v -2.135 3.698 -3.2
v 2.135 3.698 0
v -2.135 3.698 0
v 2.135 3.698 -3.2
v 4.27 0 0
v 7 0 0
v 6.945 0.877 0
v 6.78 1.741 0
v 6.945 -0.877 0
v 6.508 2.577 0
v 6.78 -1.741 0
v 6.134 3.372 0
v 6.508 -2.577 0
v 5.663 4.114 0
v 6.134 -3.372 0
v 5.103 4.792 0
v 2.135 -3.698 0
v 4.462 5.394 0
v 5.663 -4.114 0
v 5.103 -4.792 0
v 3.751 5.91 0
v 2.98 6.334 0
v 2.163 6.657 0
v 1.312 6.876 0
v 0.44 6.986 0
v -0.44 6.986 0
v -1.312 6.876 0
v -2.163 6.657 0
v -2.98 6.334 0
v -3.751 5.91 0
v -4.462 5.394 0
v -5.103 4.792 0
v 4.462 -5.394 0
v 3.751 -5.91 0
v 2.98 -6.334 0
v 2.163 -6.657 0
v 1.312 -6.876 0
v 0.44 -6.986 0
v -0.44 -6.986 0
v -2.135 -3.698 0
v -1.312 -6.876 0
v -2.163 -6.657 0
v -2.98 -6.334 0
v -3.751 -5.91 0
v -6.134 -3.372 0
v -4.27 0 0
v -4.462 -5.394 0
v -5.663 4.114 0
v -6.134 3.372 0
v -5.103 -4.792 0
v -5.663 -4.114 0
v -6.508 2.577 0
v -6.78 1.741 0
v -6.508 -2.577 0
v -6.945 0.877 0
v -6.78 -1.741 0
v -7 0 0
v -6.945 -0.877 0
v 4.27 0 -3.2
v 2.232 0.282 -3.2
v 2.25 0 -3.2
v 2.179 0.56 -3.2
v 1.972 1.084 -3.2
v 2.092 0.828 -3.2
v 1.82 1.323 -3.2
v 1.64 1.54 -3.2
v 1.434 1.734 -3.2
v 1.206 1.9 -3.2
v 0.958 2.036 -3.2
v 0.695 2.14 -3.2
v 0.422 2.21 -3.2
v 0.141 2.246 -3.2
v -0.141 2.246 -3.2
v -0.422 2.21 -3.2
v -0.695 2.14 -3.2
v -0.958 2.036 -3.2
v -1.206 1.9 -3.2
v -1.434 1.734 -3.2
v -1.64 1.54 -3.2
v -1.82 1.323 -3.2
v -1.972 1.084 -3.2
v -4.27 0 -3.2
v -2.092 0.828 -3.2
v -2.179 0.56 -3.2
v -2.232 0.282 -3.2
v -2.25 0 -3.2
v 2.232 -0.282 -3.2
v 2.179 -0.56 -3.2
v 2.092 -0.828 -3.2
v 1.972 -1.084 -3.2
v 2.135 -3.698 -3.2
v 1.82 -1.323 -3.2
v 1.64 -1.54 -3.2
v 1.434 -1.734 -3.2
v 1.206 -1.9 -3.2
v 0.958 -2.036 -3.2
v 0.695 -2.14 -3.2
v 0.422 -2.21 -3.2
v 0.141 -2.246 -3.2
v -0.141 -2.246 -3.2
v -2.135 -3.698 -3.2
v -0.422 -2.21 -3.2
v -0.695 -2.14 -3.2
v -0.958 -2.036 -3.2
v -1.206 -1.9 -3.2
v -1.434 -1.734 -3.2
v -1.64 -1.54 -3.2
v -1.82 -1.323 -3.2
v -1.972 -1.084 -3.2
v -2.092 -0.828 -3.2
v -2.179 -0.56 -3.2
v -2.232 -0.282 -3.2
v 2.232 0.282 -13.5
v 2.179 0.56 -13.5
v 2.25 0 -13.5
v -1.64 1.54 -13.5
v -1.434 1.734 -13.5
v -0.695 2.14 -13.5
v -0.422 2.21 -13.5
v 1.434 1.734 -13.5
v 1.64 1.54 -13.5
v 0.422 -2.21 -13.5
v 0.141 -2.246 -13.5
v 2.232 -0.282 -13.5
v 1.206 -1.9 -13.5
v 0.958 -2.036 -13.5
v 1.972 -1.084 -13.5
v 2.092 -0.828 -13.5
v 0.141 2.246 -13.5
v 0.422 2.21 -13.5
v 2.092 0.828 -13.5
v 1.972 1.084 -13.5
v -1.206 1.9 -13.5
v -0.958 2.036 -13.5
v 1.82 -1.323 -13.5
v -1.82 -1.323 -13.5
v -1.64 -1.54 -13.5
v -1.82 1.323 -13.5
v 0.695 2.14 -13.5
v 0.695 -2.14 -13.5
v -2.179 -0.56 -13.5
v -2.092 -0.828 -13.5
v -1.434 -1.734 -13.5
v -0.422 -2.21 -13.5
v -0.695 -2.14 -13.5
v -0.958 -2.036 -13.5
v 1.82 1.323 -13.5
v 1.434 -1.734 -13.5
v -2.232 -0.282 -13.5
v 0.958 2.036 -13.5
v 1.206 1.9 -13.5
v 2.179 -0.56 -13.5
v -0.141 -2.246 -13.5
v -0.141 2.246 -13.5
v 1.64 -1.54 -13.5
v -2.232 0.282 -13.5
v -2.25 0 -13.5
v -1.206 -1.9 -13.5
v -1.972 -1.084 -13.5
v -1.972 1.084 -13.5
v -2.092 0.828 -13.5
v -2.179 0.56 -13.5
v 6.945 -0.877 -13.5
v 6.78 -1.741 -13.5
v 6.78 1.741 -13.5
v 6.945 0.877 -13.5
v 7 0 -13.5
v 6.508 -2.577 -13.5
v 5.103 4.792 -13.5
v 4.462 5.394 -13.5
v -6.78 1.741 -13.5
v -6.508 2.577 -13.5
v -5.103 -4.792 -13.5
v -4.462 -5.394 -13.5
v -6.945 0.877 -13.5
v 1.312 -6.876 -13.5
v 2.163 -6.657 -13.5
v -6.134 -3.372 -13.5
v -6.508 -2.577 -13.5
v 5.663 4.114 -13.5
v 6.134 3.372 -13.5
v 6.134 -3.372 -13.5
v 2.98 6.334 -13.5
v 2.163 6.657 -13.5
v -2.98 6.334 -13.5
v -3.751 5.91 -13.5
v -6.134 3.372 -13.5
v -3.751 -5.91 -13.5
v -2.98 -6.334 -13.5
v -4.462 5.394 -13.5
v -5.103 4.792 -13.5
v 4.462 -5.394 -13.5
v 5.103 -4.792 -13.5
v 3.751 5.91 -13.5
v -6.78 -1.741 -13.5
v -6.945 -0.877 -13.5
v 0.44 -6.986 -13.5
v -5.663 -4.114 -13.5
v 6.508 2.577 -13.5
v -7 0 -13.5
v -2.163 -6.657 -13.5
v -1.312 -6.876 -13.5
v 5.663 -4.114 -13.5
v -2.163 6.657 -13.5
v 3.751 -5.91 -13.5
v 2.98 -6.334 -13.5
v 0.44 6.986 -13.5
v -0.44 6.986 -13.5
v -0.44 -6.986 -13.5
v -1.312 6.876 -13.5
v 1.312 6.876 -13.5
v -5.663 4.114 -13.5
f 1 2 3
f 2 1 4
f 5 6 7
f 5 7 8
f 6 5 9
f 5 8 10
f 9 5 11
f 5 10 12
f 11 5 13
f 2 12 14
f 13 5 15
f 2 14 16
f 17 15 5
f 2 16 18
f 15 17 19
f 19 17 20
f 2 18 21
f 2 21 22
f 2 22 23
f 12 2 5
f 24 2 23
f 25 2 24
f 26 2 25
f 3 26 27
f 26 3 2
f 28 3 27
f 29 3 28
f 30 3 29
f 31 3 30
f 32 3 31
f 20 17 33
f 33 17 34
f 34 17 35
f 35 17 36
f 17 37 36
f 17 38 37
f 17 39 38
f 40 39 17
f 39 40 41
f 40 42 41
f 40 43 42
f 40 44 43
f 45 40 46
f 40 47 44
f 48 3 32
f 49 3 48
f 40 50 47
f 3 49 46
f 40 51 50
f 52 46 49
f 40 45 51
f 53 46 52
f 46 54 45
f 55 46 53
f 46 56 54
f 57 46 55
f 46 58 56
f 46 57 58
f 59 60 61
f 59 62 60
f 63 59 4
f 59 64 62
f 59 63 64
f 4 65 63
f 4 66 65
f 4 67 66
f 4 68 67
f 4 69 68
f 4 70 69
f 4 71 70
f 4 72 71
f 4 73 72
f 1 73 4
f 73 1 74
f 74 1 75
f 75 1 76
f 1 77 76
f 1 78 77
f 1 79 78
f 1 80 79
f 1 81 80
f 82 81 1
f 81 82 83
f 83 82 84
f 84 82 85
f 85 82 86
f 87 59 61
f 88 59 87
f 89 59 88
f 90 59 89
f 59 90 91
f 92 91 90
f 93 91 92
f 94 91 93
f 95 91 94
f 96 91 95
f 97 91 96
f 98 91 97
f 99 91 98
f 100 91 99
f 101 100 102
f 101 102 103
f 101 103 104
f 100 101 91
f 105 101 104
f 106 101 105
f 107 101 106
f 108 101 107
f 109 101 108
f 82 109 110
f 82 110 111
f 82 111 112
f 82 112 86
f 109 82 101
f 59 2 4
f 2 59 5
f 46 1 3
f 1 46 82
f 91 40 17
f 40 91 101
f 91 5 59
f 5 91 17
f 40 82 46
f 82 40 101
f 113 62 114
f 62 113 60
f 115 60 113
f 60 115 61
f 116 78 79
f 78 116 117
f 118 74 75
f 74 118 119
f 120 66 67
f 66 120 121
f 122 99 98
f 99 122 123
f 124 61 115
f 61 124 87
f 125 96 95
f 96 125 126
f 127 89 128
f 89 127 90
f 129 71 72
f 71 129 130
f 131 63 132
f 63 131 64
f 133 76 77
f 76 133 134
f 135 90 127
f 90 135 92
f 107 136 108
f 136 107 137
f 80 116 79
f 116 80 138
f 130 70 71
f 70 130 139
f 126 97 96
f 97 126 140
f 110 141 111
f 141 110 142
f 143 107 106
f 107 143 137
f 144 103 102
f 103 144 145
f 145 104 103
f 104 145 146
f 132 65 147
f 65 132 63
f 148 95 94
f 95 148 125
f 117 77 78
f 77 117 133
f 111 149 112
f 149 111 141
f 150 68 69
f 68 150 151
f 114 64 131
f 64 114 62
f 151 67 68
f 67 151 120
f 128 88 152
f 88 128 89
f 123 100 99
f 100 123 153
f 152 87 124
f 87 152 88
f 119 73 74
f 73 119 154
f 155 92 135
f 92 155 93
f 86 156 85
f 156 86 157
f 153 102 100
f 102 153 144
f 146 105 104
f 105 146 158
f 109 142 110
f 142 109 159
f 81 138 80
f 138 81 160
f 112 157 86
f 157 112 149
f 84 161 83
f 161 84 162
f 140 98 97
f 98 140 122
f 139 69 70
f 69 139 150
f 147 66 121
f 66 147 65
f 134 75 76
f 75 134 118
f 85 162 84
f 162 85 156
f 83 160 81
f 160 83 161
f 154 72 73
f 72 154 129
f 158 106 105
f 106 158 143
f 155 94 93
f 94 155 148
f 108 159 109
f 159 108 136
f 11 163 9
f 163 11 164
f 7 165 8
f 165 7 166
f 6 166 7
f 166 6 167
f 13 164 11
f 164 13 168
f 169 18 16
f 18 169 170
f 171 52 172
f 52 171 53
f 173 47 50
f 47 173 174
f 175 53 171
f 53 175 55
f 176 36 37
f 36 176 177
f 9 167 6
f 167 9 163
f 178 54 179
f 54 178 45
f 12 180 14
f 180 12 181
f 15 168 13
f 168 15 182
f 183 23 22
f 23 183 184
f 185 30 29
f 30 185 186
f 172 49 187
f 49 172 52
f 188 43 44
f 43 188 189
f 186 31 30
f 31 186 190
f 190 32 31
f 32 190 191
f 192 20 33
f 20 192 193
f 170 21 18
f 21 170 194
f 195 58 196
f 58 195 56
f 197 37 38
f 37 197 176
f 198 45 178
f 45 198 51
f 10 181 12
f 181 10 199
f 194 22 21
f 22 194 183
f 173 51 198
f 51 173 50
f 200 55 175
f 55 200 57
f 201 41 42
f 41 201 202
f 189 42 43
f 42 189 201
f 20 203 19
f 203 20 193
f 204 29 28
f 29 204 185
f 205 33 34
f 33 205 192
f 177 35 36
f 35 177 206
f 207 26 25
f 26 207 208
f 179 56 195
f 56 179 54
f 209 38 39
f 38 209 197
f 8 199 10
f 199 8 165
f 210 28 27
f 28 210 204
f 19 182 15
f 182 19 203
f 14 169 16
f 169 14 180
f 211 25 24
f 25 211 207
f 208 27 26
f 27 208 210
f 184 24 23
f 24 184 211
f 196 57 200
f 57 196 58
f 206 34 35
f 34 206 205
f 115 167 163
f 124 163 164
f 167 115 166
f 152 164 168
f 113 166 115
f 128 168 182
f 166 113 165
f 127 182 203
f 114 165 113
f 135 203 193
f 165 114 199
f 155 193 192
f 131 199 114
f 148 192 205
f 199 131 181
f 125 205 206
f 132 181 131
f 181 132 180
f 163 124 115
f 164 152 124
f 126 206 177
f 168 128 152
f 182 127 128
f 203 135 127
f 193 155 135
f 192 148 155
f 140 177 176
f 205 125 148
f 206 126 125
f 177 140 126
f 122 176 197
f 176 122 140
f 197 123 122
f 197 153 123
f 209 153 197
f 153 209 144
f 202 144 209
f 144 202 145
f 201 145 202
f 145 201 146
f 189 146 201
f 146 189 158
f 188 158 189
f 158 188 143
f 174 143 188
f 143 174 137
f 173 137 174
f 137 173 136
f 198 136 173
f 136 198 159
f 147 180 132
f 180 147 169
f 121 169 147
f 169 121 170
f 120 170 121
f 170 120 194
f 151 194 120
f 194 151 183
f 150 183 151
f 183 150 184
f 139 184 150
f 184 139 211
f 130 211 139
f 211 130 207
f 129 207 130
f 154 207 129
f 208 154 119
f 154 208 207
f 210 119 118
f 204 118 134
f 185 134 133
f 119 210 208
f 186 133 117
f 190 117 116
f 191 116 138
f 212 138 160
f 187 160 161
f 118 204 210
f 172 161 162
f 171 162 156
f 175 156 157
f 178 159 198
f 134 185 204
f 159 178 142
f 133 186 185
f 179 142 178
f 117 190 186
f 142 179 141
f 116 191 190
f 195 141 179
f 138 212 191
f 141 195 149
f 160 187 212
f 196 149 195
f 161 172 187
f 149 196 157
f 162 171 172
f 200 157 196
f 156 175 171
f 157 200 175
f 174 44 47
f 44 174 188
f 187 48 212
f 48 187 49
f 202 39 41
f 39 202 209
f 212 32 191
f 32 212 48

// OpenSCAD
$fn = 50;

difference() {
	union() {
		translate(v = [0, 0, -13.5]) {
			cylinder(h = 13.5, r = 7.0);
		}
	}
	union() {
		translate(v = [0, 0, 0]) {
			rotate(a = [0, 0, 0]) {
				difference() {
					union() {
						translate(v = [0, 0, -3.2]) {
							linear_extrude(height = 3.2) {
								polygon(points = [[4.2698, 0.0], [2.1349000000000005, 3.697755269078796], [-2.134899999999999, 3.6977552690787965], [-4.2698, 5.228996902999369e-16], [-2.134900000000002, -3.6977552690787956], [2.1348999999999974, -3.697755269078798]]);
							}
						}
					}
					union();
				}
			}
		}
		#translate(v = [0, 0, -100.0]) {
			cylinder(h = 200, r = 2.25);
		}
	}
}
